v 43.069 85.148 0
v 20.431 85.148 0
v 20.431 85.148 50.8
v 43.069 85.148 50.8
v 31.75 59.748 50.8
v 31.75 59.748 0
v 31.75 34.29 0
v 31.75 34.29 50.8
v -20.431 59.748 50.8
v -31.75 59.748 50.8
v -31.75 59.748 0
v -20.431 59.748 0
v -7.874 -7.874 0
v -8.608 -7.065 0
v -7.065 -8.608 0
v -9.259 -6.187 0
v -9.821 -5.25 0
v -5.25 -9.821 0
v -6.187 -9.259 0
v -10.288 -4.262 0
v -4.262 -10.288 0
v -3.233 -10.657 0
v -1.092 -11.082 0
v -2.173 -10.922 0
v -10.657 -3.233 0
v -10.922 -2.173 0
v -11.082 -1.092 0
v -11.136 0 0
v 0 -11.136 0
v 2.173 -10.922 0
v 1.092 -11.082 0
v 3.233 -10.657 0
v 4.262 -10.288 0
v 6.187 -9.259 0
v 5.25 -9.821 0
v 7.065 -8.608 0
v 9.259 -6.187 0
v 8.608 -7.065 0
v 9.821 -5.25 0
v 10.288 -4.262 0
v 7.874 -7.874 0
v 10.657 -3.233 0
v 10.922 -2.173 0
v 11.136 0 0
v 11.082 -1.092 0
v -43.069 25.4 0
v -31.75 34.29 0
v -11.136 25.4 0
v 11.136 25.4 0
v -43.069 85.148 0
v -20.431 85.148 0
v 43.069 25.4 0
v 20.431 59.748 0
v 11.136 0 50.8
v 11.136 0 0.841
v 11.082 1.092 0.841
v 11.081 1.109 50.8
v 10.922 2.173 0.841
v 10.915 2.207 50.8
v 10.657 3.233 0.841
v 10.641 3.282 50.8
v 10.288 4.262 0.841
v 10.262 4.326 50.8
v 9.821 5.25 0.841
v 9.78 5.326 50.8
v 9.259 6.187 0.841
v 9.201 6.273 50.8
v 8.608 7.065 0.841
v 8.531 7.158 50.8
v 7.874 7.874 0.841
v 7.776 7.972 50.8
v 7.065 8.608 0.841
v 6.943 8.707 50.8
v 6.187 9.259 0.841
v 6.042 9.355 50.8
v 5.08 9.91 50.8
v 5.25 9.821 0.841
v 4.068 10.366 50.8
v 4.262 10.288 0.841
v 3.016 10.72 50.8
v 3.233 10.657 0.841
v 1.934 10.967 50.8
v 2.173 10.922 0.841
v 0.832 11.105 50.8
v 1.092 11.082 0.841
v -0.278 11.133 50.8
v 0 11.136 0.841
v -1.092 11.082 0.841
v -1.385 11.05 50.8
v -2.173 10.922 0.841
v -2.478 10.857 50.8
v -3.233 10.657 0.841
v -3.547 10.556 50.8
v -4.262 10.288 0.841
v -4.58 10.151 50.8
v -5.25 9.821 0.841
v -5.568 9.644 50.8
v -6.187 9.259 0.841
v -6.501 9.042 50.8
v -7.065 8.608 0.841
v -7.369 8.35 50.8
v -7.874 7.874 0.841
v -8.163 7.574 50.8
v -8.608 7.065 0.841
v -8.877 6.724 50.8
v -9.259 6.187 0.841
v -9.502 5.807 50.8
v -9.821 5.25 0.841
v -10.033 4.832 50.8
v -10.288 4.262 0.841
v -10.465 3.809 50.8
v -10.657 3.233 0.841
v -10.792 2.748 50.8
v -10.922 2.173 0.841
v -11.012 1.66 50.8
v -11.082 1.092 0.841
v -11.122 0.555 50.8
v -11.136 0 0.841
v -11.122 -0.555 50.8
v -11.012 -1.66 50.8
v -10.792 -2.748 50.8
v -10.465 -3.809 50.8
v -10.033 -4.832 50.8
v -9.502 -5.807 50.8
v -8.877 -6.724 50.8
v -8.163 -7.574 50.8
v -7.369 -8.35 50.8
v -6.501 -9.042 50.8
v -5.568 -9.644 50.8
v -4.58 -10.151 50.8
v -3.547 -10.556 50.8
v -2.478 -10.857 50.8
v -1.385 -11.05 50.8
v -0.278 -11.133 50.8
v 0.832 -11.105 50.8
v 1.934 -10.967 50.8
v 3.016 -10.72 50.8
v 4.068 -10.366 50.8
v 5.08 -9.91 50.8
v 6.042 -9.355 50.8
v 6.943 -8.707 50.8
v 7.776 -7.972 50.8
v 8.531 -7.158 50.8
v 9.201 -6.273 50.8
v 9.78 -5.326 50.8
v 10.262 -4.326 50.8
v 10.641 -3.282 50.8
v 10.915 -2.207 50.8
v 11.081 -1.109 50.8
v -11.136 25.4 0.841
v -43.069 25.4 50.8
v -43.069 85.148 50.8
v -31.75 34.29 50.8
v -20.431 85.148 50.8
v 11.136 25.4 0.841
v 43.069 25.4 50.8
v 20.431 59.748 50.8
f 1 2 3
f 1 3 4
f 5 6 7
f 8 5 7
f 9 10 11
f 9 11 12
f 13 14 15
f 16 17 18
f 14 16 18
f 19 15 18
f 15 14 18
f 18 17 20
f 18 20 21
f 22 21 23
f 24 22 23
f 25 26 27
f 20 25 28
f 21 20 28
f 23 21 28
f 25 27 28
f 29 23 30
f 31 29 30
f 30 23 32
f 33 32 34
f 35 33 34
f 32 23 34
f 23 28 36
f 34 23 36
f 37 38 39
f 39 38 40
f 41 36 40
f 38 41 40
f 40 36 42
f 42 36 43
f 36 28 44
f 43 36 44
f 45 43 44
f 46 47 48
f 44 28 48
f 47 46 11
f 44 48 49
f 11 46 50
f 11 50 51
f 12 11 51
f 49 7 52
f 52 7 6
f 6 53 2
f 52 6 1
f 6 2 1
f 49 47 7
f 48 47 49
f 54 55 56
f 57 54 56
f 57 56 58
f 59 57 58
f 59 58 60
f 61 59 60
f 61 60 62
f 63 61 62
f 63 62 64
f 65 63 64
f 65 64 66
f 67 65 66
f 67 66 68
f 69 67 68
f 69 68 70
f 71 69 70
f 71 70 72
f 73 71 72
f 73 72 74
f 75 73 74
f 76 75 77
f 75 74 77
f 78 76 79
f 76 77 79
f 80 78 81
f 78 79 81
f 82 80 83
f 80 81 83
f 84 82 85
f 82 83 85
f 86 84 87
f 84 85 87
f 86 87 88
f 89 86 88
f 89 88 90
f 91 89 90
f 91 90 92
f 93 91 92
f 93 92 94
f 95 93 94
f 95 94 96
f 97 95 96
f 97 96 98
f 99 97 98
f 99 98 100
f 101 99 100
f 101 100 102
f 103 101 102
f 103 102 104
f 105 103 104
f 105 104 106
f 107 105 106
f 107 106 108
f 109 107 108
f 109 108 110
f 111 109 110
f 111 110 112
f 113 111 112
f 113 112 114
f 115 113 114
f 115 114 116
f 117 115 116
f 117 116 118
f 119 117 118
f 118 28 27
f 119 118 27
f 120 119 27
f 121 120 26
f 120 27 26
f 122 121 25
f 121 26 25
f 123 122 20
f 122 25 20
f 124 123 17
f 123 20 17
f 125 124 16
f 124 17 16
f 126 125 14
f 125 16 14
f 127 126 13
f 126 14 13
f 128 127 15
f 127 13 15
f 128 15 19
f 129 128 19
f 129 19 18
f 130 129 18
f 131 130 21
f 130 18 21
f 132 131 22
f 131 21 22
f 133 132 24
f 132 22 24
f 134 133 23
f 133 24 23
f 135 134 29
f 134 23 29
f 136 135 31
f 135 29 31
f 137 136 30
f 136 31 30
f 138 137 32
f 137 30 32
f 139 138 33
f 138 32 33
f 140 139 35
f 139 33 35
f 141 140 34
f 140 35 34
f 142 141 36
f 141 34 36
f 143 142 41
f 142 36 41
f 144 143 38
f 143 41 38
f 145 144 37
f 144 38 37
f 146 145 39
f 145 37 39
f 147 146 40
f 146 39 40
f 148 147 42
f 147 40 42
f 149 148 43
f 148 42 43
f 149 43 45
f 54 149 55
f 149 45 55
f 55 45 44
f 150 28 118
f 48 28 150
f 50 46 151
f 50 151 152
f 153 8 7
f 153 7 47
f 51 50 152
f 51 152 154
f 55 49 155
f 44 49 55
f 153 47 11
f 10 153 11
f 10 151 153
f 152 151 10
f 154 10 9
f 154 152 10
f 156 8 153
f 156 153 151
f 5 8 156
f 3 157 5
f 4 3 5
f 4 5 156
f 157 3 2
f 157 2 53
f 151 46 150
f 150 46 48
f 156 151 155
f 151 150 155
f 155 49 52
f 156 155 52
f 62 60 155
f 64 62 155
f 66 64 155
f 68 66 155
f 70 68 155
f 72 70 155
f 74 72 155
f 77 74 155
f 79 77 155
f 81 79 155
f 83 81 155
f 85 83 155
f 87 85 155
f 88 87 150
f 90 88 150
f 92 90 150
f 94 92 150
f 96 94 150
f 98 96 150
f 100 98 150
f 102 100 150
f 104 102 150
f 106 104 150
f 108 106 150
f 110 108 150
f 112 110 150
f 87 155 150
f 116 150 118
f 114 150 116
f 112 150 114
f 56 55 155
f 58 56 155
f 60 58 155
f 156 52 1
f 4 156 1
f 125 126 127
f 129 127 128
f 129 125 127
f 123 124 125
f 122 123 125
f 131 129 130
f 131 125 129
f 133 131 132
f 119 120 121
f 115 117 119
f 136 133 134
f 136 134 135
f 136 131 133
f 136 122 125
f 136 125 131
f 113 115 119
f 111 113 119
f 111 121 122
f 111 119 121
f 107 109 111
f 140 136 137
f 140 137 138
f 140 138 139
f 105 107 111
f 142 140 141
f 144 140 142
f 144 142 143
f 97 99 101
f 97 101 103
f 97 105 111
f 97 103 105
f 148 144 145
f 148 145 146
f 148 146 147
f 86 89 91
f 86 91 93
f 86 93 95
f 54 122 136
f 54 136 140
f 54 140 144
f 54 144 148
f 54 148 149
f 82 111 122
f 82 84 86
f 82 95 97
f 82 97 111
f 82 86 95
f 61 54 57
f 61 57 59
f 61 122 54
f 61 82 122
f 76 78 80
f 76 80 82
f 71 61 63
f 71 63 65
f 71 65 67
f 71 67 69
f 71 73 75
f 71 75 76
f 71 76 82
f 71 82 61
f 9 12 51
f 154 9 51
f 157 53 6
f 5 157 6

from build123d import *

# Parameters (mm, degrees)
BOSS_EXTRUDE1_DEPTH = 0.840608912
SKETCH2_R           = 11.136118556
BOSS_EXTRUDE2_DEPTH = 50.8
SKETCH3_W           = 86.137031446
SKETCH3_H           = 59.748072355
BOSS_EXTRUDE3_DEPTH = 50.8
CUT_EXTRUDE1_DEPTH  = 109.100560925


with BuildPart() as part:
    # Sketch1 → Boss-Extrude1 (new body)
    with BuildSketch(Plane.XY):
        with BuildLine():
            Line((-11.136118556, 0), (-11.136118556, 25.4))
            Line((-11.136118556, 25.4), (11.136118556, 25.4))
            Line((11.136118556, 25.4), (11.136118556, 0))
            ThreePointArc((11.136118556, 0), (0, 11.136118556), (-11.136118556, 0))
        make_face()
    extrude(amount=BOSS_EXTRUDE1_DEPTH)

    # Sketch2 → Boss-Extrude2 (add)
    with BuildSketch(Plane.XY):
        Circle(SKETCH2_R)
    extrude(amount=BOSS_EXTRUDE2_DEPTH)

    # Sketch3 → Boss-Extrude3 (add)
    with BuildSketch(Plane.XY):
        with Locations((0, 55.274036178)):
            Rectangle(SKETCH3_W, SKETCH3_H)
    extrude(amount=BOSS_EXTRUDE3_DEPTH)

    # Sketch4 → Cut-Extrude1 (cut, through all)
    with BuildSketch(Plane.XY.offset(50.8)):
        Polygon((20.431484277, 85.148072355), (20.431484277, 59.748072355), (31.75, 59.748072355), (31.75, 34.29), (-31.75, 34.29), (-31.75, 59.748072355), (-20.431484277, 59.748072355), (-20.431484277, 85.148072355), align=None)
    extrude(amount=-CUT_EXTRUDE1_DEPTH, mode=Mode.SUBTRACT)


solid = part.part
